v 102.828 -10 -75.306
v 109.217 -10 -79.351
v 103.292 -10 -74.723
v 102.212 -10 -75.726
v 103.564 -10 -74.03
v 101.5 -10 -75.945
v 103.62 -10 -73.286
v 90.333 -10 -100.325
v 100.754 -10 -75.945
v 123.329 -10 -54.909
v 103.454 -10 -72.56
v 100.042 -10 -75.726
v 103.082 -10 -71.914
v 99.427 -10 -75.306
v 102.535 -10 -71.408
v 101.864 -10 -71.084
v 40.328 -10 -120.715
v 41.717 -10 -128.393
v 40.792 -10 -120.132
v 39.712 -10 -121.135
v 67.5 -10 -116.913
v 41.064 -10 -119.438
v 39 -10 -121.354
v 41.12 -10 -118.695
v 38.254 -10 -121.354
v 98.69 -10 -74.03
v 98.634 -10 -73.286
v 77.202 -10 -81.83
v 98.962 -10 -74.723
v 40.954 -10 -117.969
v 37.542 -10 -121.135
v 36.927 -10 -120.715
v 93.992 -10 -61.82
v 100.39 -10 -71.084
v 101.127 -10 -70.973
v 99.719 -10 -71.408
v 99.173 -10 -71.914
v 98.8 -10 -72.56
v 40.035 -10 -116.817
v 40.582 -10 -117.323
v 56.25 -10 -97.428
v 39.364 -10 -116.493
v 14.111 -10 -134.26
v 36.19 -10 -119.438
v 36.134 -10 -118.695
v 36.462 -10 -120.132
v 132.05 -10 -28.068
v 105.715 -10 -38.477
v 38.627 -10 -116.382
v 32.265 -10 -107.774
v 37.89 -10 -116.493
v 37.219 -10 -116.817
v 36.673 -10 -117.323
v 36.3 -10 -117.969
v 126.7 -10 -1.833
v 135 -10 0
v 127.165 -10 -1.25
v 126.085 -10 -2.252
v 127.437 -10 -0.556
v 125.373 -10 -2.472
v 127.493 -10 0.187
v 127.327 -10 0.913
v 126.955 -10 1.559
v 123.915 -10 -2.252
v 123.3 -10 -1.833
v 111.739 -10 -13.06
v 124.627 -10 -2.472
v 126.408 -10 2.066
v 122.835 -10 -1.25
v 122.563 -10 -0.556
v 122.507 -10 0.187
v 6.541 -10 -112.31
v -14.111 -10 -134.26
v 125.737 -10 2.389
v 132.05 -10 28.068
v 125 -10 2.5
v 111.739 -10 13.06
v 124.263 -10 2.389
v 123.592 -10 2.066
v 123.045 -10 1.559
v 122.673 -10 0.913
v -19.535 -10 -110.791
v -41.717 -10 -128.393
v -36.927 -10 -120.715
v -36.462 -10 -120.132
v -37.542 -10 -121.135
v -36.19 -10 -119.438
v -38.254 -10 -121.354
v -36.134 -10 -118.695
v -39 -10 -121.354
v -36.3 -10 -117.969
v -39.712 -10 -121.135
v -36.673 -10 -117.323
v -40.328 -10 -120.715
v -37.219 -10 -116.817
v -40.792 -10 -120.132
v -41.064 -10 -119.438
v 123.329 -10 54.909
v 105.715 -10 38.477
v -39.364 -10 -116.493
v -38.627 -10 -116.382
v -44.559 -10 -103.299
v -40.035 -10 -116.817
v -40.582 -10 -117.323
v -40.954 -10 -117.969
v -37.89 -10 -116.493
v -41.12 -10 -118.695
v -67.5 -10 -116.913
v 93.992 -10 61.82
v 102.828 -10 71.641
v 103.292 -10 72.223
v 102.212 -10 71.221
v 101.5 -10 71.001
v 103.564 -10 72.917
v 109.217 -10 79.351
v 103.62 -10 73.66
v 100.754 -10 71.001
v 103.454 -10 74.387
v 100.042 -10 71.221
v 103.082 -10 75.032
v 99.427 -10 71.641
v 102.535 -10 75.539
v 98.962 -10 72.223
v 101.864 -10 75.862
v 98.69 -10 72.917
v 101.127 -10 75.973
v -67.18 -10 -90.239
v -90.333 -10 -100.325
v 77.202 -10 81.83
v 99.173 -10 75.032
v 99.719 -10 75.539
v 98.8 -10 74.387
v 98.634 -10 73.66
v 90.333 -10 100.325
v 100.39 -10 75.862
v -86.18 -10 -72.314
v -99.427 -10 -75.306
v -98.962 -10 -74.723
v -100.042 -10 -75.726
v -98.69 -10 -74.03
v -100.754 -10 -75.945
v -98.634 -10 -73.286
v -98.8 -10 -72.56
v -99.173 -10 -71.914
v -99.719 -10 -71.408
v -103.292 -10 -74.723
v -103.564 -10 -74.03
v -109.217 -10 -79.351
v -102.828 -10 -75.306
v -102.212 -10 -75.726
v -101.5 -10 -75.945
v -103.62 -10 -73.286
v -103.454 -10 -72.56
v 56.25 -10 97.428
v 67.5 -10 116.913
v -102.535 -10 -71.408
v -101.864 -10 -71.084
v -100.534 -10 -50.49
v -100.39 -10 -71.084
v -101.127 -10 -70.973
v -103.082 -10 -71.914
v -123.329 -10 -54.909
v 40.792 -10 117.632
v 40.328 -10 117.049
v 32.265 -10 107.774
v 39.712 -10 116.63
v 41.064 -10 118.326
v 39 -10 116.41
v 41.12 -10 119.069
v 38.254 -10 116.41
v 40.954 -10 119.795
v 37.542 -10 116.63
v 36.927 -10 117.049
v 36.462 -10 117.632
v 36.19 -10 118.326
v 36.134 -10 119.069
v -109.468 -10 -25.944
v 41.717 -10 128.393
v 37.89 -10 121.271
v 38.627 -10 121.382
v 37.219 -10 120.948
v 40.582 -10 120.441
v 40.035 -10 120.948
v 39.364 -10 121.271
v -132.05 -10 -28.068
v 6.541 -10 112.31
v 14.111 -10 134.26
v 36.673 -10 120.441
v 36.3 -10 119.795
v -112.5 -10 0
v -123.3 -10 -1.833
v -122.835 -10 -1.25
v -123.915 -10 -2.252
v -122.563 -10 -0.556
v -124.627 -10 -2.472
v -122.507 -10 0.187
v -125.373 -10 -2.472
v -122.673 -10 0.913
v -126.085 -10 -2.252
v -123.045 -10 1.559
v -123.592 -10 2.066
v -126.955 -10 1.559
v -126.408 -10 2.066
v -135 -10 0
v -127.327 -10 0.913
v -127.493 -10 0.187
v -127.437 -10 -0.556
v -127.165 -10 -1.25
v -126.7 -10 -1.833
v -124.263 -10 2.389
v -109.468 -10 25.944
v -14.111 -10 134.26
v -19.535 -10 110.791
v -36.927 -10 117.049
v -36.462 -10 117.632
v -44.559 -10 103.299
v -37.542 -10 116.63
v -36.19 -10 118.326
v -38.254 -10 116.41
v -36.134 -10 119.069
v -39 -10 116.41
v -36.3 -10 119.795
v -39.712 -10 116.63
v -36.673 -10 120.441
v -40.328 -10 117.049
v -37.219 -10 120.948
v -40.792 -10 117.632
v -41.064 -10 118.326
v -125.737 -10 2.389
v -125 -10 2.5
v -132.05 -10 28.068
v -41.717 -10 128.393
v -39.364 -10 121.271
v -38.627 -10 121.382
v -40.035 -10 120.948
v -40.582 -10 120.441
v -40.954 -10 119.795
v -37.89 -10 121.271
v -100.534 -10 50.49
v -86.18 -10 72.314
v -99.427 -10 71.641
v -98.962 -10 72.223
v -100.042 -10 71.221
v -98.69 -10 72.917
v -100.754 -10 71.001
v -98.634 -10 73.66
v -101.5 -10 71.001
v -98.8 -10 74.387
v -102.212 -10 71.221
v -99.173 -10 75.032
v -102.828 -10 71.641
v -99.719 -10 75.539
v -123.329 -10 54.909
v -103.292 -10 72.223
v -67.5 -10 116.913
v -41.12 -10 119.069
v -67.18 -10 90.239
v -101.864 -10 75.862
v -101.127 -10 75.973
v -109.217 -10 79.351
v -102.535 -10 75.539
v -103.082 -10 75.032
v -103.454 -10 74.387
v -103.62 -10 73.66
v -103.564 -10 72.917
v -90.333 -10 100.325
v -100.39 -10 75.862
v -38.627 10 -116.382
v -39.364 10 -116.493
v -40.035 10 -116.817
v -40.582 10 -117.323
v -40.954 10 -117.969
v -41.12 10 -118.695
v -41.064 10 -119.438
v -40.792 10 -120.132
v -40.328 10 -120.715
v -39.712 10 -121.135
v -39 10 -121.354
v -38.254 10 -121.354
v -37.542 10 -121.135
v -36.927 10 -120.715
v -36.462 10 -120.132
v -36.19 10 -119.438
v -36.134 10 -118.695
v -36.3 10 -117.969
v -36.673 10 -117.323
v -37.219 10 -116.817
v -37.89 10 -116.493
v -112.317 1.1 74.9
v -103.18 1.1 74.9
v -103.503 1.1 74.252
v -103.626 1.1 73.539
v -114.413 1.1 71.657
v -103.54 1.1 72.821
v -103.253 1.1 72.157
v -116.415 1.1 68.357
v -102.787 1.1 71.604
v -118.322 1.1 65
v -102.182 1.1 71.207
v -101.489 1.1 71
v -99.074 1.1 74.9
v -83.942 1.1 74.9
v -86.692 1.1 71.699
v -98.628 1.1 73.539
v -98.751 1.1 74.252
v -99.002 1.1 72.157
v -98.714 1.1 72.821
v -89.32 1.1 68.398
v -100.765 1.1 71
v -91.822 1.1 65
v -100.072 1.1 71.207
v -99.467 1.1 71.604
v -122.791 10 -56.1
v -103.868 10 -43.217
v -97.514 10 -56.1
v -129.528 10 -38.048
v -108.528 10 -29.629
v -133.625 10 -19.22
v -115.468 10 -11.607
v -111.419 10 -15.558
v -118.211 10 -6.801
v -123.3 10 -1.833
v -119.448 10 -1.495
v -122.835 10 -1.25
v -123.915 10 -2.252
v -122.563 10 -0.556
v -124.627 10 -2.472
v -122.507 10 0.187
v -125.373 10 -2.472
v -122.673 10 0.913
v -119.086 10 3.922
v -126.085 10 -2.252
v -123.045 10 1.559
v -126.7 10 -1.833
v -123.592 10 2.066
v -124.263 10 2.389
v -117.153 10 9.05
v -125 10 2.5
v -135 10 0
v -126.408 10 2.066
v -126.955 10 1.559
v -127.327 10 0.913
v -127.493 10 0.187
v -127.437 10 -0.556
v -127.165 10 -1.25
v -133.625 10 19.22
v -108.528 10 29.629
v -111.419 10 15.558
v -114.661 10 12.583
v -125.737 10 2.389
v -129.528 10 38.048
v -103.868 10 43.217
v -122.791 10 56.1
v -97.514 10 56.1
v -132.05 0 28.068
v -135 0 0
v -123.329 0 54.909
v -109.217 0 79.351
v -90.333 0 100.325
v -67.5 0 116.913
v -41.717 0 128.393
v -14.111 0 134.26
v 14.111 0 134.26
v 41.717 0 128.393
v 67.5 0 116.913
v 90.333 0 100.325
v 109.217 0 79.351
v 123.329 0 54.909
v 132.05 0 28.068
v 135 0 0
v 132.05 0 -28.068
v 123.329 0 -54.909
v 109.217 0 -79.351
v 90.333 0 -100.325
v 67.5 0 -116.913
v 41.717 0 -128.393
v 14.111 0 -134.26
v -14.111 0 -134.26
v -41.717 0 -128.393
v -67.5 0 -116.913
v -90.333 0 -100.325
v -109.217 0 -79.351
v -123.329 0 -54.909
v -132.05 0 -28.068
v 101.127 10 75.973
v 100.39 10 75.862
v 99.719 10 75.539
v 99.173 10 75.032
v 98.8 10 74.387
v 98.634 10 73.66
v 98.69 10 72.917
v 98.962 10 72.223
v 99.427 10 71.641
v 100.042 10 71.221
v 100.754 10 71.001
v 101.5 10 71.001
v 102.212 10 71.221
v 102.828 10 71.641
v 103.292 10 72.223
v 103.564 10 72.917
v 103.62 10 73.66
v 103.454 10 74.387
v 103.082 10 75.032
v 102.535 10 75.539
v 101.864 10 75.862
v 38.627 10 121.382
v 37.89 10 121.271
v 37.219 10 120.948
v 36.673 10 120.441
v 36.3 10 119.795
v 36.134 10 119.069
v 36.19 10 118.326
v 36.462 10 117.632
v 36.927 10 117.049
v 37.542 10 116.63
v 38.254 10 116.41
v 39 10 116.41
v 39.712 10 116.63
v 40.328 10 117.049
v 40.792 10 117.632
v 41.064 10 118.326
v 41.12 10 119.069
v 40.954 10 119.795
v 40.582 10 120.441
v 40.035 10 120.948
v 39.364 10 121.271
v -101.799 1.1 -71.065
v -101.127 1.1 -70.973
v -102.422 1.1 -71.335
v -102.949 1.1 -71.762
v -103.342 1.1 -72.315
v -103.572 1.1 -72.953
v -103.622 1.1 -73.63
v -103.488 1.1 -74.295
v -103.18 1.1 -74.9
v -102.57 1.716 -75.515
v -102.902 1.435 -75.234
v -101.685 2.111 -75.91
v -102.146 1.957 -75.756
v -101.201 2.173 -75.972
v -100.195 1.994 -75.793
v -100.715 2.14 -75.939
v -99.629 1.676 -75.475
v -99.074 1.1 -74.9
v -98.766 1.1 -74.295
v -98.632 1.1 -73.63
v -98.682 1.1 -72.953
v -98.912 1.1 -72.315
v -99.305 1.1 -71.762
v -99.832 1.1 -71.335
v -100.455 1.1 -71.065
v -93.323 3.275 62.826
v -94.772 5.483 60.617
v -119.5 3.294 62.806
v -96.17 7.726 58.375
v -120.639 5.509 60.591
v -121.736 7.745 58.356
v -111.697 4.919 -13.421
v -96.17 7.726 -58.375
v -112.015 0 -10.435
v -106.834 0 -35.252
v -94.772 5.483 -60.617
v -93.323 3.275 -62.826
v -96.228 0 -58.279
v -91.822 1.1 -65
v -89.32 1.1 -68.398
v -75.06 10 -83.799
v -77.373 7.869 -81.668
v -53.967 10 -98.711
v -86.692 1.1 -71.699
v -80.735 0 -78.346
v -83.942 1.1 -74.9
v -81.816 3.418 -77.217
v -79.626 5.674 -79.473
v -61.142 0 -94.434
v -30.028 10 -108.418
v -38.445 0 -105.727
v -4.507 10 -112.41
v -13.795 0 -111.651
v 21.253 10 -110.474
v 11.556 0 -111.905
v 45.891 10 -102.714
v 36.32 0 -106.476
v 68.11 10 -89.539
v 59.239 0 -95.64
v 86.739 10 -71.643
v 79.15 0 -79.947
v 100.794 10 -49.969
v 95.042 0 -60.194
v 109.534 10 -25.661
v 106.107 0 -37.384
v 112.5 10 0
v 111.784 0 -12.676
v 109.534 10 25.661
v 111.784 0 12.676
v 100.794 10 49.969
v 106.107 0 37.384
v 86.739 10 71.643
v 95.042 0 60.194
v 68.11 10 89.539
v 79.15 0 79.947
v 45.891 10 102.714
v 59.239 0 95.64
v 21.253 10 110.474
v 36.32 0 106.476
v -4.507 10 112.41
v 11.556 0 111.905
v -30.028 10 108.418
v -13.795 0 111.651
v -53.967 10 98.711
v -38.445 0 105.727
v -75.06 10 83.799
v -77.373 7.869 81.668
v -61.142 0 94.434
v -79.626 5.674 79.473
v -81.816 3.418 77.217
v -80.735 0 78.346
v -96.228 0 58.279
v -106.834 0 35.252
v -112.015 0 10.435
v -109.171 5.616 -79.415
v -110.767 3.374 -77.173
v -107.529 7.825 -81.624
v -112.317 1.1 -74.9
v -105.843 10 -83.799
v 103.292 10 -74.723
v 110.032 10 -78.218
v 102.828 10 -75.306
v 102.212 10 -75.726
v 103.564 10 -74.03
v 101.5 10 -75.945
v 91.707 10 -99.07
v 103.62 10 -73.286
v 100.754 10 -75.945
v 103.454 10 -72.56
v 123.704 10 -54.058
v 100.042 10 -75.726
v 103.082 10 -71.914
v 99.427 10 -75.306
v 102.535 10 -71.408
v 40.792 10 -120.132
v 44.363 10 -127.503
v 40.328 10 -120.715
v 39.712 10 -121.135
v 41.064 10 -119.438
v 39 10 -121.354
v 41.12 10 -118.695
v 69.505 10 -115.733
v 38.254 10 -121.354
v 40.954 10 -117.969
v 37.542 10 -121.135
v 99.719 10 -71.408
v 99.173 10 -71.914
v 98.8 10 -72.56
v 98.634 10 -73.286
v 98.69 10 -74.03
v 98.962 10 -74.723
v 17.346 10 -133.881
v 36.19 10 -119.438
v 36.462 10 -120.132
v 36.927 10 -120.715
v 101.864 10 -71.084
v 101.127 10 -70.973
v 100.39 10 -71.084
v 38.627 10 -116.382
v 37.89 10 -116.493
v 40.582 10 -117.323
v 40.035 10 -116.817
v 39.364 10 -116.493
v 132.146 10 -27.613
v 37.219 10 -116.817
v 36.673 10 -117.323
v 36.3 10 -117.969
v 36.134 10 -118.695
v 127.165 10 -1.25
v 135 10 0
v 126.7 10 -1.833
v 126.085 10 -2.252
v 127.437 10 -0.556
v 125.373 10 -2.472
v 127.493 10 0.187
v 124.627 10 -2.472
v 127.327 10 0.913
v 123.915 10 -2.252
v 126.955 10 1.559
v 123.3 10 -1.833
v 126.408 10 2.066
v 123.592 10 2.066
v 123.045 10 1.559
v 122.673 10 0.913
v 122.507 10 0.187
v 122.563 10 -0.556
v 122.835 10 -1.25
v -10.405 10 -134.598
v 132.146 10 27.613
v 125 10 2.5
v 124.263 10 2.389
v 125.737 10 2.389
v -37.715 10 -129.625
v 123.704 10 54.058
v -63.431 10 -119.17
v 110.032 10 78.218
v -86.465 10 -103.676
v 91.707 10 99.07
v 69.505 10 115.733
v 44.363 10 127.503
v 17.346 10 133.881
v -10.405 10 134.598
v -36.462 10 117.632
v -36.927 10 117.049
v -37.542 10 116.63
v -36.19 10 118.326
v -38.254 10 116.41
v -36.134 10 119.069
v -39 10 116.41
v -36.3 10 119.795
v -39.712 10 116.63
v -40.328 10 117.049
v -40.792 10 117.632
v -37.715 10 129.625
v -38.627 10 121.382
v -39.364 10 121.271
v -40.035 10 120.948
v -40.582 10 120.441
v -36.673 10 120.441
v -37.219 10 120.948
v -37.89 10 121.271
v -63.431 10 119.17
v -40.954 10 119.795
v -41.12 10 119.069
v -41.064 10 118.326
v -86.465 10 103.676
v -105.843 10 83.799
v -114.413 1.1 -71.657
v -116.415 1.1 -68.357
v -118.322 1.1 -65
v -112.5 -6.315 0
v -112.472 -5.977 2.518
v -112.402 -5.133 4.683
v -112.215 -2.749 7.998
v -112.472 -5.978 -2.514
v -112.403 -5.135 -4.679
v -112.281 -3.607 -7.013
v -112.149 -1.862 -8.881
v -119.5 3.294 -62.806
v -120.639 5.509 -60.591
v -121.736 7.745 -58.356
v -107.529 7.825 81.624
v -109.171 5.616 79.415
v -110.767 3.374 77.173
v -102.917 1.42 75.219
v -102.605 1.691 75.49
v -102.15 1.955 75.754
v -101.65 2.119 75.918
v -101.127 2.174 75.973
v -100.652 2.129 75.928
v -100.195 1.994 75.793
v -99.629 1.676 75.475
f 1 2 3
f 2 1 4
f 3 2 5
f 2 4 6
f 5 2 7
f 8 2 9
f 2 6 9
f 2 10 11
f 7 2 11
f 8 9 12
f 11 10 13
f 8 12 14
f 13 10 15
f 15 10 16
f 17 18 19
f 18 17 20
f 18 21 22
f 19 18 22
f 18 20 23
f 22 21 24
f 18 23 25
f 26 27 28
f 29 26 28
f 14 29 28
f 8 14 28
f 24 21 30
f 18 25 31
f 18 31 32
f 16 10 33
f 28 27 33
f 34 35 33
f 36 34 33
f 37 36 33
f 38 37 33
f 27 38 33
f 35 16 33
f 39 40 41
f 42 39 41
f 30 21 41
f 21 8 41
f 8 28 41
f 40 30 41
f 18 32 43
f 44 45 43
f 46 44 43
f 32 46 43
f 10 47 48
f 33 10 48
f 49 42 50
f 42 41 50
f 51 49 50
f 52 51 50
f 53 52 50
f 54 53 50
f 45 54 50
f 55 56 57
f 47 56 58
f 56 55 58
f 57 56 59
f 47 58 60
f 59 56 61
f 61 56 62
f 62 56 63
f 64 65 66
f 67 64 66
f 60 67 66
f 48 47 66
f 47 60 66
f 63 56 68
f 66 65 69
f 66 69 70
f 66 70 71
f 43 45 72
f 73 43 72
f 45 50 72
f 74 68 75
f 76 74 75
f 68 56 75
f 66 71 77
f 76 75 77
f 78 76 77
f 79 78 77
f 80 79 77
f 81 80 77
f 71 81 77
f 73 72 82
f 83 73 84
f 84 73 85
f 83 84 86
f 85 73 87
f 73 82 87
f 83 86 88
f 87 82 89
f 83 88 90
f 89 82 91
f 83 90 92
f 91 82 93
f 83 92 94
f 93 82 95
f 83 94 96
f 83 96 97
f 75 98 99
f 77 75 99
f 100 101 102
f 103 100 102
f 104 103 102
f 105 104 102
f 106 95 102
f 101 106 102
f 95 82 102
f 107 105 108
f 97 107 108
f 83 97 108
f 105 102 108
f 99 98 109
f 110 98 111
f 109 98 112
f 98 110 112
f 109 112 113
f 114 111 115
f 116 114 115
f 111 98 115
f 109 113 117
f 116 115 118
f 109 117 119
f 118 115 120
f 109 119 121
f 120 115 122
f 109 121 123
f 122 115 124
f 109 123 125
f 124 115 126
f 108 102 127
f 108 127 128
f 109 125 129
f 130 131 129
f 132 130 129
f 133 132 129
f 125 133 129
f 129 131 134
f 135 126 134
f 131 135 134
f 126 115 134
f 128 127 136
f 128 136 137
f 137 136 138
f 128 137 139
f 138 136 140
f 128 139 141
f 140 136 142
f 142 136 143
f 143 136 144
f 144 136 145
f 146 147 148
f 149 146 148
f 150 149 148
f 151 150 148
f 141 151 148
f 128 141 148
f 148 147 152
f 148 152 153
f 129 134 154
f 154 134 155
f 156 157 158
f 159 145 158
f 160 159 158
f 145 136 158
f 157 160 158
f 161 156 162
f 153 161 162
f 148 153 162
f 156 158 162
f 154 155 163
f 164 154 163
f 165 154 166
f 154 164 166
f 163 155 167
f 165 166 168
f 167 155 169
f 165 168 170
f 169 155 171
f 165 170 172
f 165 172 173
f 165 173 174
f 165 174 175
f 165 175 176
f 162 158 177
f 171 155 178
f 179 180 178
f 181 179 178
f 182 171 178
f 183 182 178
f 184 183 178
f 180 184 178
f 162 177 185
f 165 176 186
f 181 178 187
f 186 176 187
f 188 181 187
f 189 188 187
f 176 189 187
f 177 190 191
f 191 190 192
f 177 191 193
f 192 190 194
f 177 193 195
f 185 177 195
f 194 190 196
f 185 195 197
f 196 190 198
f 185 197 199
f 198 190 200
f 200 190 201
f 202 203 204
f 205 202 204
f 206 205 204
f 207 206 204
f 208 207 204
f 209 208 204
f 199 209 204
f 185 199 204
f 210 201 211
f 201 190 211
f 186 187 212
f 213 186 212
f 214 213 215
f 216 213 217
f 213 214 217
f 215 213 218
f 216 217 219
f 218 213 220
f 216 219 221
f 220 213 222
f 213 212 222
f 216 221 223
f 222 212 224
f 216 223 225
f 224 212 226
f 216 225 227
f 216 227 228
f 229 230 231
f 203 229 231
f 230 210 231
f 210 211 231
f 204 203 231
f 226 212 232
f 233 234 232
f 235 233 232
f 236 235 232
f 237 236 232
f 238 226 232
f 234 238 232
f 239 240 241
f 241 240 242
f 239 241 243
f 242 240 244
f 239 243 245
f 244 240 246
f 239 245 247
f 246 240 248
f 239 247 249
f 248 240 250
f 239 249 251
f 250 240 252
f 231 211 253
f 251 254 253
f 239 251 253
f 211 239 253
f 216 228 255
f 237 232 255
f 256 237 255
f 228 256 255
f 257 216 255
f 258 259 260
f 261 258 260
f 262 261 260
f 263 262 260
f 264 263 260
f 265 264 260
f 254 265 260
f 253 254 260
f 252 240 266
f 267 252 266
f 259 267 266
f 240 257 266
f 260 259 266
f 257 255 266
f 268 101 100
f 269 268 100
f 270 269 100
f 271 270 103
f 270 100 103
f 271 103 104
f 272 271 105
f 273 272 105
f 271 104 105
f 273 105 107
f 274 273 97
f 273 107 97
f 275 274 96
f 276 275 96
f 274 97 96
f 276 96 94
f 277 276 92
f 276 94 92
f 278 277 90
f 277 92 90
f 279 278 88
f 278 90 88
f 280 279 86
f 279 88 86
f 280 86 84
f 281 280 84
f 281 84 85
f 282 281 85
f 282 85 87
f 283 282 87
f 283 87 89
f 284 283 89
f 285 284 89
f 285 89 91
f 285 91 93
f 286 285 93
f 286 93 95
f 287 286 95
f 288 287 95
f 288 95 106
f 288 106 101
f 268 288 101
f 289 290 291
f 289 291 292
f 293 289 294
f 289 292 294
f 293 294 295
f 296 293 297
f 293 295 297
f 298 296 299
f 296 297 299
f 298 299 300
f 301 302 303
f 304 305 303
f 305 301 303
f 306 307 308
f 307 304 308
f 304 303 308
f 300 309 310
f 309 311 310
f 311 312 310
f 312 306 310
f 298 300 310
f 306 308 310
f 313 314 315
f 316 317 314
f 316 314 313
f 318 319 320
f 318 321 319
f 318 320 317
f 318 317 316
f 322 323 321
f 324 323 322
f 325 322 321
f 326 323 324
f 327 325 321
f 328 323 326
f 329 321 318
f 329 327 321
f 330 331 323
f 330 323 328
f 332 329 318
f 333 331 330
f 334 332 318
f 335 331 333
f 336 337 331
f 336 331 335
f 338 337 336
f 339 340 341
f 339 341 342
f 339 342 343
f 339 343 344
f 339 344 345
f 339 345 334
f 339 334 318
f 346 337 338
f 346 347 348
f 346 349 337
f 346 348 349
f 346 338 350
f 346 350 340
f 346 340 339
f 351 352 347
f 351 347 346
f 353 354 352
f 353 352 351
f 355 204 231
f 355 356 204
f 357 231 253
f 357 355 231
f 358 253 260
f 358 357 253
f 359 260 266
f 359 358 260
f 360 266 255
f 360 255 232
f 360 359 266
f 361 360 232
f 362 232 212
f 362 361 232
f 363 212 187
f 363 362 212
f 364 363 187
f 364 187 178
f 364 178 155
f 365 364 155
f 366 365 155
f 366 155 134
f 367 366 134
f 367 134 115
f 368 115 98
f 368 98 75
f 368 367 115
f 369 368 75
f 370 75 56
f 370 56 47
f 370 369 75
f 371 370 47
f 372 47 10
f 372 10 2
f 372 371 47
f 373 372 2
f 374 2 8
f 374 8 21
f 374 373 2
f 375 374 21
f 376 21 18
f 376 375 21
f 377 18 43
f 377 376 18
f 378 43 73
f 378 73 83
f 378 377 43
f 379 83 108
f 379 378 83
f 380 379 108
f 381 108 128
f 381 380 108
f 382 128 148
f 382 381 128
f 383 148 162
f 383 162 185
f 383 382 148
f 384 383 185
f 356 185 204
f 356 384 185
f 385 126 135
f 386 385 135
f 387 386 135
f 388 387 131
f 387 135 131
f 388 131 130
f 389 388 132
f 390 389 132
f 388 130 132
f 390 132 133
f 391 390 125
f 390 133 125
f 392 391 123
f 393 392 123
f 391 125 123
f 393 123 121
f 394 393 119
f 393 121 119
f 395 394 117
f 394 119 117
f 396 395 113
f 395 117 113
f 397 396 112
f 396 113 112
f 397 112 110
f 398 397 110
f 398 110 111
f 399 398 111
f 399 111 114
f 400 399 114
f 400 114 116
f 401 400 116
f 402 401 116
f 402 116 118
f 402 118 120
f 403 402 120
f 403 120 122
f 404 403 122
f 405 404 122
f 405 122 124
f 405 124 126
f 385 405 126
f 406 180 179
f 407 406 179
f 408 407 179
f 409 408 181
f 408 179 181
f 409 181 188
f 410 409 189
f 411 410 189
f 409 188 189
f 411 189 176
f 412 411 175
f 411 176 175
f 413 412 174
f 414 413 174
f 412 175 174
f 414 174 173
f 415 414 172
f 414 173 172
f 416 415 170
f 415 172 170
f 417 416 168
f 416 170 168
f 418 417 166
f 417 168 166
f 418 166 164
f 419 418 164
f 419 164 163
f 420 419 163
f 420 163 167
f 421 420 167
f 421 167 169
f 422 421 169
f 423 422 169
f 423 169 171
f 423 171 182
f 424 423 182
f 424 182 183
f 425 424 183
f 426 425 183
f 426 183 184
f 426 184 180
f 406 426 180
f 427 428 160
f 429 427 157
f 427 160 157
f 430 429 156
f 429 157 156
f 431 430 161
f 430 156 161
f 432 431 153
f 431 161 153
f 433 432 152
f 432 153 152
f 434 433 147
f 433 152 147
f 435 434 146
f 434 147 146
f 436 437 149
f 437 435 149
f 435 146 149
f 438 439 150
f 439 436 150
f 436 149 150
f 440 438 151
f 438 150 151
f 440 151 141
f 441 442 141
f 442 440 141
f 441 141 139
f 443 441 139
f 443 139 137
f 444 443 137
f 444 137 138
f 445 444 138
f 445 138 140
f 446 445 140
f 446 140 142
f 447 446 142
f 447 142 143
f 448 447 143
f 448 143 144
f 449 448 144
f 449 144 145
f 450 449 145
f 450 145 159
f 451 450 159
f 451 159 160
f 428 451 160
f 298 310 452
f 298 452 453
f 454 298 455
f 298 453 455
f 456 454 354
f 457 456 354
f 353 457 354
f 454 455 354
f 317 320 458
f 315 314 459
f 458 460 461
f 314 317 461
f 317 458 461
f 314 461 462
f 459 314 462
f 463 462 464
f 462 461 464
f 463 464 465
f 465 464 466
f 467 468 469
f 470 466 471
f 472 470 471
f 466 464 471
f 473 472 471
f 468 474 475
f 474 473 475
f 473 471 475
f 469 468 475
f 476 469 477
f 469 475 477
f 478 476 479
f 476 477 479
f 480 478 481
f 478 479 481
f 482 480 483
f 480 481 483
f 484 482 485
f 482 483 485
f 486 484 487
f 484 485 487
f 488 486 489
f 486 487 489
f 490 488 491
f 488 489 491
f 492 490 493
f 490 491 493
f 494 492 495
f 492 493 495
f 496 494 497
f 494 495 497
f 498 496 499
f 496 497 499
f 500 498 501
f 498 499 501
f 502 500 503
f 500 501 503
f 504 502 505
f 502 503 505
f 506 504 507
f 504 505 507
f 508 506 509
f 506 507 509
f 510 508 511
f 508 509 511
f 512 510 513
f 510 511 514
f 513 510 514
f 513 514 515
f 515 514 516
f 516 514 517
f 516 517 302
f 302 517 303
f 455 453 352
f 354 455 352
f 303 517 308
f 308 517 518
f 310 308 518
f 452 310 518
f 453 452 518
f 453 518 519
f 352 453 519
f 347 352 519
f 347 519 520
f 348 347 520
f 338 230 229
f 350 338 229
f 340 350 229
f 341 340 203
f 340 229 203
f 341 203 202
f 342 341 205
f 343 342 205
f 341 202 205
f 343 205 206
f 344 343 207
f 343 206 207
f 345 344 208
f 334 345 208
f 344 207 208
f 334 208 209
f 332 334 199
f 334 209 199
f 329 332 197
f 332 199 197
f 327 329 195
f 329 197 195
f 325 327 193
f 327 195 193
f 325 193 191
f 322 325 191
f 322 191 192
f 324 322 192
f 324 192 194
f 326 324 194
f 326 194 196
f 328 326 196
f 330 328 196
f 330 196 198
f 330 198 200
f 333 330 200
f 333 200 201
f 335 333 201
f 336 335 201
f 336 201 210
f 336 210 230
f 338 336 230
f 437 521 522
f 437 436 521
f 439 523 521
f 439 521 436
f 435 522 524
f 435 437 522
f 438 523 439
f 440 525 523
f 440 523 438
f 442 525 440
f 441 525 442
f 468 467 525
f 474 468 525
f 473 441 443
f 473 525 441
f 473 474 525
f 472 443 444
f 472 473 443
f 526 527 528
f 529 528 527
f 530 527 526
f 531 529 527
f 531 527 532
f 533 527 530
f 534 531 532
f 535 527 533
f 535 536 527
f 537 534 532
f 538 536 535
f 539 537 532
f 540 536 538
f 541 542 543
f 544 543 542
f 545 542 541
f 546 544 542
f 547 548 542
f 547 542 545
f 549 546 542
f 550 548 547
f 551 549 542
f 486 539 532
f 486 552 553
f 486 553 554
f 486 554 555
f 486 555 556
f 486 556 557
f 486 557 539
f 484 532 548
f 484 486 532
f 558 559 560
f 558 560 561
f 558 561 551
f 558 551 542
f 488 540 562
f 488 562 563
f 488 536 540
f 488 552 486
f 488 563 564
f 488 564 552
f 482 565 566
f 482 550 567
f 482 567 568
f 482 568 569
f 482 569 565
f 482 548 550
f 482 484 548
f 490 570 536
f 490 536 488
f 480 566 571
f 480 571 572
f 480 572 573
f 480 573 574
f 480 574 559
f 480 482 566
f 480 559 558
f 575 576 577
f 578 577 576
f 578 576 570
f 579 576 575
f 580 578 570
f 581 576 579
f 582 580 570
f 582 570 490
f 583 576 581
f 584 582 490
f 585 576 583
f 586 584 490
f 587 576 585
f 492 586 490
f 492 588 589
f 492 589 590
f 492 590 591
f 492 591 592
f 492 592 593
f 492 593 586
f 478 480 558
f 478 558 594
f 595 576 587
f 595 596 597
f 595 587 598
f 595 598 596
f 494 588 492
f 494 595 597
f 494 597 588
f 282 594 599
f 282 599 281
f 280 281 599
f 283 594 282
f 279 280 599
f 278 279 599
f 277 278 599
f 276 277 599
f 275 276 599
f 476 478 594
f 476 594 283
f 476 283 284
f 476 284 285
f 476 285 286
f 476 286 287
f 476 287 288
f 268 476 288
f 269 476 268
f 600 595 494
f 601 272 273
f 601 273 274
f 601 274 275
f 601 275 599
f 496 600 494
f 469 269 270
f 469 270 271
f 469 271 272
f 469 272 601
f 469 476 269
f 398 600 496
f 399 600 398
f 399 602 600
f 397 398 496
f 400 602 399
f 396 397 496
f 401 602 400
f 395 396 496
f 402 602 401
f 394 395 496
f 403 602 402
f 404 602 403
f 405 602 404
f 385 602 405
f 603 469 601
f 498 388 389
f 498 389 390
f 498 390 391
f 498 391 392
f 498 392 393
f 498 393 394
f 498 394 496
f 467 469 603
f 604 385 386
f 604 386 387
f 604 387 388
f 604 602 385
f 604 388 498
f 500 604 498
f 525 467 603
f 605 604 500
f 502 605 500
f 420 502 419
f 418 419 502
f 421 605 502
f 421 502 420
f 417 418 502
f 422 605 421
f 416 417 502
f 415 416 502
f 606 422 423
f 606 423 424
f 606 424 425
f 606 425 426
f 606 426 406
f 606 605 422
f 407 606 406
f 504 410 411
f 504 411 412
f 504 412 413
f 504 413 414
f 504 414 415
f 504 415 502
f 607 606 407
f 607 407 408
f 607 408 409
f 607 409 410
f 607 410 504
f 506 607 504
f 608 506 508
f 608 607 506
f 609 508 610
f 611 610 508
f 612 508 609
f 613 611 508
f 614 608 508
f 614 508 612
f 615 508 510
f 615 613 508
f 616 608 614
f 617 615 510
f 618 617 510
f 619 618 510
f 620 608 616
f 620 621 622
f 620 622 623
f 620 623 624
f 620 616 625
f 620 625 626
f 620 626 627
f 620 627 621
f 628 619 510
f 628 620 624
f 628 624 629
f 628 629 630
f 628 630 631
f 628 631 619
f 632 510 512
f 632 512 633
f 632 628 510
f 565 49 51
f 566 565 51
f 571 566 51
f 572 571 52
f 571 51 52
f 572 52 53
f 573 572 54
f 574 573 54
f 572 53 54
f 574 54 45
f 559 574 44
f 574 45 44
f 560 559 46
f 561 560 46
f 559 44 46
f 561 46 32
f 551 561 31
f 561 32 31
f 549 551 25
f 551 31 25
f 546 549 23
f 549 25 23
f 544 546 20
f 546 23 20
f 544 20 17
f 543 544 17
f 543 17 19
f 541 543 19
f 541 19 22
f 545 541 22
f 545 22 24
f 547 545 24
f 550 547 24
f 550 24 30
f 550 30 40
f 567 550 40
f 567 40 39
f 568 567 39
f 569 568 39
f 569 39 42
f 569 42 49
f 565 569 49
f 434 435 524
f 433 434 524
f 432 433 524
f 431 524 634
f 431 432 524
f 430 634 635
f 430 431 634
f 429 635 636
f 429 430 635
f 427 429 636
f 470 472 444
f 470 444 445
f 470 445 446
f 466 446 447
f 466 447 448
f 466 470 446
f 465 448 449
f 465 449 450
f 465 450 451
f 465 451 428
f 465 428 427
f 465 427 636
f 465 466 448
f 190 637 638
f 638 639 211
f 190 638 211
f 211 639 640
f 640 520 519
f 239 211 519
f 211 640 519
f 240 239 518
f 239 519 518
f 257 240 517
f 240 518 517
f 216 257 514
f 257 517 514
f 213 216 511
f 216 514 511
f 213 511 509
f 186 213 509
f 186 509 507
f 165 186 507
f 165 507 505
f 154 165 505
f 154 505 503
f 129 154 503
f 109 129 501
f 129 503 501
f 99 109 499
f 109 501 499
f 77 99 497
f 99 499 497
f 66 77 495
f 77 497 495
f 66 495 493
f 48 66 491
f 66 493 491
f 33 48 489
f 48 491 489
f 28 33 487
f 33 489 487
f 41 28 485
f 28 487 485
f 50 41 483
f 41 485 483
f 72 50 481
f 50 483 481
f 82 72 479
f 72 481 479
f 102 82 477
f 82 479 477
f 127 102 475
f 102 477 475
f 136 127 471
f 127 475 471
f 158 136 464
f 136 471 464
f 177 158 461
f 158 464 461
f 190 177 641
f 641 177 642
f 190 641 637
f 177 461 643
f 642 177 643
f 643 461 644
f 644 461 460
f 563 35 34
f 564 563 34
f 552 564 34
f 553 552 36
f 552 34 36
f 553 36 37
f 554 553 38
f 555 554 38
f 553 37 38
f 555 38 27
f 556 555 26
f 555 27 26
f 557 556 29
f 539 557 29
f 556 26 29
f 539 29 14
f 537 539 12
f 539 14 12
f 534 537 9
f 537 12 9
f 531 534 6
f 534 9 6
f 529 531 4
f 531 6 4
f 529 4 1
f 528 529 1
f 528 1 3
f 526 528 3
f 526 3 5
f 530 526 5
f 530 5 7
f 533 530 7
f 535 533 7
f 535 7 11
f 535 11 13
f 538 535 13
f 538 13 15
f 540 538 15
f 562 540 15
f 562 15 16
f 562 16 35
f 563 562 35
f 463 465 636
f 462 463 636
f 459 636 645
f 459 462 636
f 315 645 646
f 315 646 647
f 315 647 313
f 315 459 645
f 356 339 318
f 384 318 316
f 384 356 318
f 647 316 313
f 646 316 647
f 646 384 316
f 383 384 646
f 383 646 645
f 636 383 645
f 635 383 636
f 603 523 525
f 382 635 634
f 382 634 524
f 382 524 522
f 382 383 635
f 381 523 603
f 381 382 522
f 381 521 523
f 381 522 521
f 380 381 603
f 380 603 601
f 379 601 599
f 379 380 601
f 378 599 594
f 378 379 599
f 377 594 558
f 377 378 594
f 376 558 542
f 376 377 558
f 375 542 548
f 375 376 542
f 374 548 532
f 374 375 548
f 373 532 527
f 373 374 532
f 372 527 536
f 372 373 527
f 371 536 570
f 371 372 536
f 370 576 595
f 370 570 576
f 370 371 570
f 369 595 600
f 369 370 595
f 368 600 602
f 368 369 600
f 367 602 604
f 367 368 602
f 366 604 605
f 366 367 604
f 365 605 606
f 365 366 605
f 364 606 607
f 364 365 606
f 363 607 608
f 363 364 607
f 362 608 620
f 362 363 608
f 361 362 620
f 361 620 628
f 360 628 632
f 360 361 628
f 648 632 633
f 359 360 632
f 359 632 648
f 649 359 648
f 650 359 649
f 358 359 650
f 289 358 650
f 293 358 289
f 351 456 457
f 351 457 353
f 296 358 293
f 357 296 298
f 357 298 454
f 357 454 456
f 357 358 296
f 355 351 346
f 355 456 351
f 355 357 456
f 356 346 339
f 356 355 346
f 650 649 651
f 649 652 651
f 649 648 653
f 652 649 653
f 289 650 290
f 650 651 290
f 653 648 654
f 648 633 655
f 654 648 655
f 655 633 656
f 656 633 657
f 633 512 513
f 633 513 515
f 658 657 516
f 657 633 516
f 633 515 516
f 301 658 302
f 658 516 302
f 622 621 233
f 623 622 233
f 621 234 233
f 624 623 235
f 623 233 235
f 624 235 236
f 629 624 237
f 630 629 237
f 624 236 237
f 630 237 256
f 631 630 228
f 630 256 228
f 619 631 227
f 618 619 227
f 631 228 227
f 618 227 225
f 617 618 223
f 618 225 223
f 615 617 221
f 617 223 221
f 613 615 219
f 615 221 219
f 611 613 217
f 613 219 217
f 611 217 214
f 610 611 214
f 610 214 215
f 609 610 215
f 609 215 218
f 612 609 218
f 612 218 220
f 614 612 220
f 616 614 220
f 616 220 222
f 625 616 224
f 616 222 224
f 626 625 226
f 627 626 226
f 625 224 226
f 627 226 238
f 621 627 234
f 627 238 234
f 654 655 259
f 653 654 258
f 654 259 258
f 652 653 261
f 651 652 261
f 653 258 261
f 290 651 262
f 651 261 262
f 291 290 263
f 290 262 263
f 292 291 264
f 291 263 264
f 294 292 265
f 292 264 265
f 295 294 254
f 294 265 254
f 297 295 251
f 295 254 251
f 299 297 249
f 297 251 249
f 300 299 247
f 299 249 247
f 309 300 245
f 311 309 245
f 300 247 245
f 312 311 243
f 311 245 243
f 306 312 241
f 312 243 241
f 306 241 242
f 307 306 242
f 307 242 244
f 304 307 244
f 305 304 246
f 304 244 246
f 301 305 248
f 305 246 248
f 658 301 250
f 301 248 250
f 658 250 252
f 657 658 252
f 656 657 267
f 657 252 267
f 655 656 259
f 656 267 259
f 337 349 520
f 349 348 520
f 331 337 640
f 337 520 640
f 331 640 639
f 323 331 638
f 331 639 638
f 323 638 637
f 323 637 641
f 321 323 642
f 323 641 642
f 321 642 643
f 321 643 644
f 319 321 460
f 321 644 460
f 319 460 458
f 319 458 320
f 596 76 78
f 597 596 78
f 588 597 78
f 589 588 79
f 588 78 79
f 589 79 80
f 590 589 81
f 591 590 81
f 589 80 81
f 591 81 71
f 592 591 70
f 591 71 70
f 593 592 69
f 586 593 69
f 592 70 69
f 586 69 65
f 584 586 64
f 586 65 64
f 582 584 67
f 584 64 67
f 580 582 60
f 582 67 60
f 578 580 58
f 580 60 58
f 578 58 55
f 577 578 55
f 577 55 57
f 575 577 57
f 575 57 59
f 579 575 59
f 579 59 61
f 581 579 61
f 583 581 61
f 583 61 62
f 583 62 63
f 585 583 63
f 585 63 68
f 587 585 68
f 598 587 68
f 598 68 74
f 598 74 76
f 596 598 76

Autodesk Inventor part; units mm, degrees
ref_plane "YZ Plane" through (0, 0, 0) normal (1, 0, 0) x (0, 1, 0)
sketch "Sketch1" plane through (0, 0, 0) normal (0, 1, 0) x (-1, 0, 0)
  circle A0 centre (0, 0) radius 135
  circle A1 centre (0, 0) radius 112.5
  dimension "d0" = 270
  dimension "d1" = 225
extrude "Extrusion1" add sketch "Sketch1" along normal mid plane 20
sketch "Sketch3" plane through (0, 10, 0) normal (0, 1, 0) x (1, 0, 0)
  circle A0 centre (0, 0) radius 125
  circle A1 centre (125, 0) radius 2.5
  circle A2 centre (101.1271, 73.4732) radius 2.5
  circle A3 centre (38.6271, 118.8821) radius 2.5
  circle A4 centre (-38.6271, 118.8821) radius 2.5
  circle A5 centre (-101.1271, 73.4732) radius 2.5
  circle A6 centre (-125, 0) radius 2.5
  circle A7 centre (-101.1271, -73.4732) radius 2.5
  circle A8 centre (-38.6271, -118.8821) radius 2.5
  circle A9 centre (38.6271, -118.8821) radius 2.5
  circle A10 centre (101.1271, -73.4732) radius 2.5
  dimension "d7" = 250
  dimension "d8" = 5
  dimension "d11" = 360
hole "Hole1" at (125, 10, 0) at (101.1271, 10, 73.4732) at (38.6271, 10, 118.8821) at (-38.6271, 10, 118.8821) at (-101.1271, 10, 73.4732) at (-125, 10, 0) at (-101.1271, 10, -73.4732) at (-38.6271, 10, -118.8821) at (38.6271, 10, -118.8821) at (101.1271, 10, -73.4732) direction (0, -1, 0) diameter 5 end through all
ref_plane "Work Plane6" through (-134.9375, 20, -12.7) normal (0.3947, -0.9188, 0) x (0, 0, 1)
ref_plane "Work Plane7" through (-109.8713, -38.3432, -12.7) normal (0.3947, -0.9188, 0) x (0, 0, 1)
sketch "Sketch5" plane through (-109.8713, -38.3432, -12.7) normal (0.3947, -0.9188, 0) x (0, 0, 1)
  circle A0 centre (12.7, -30.2265) radius 20
  point P0 (12.7, -116.0845)
  dimension "d26" = 40
  dimension "d27" = 85.858
extrude "Extrusion4" cut sketch "Sketch5" against normal blind 251.3
sketch "Sketch6" plane through (0, 0, 0) normal (1, 0, 0) x (0, 1, 0)
  line L0 (10, 15.5601) -> (10, -15.5601) projected
  line L1 (10, 0) -> (-10, 0)
  line L2 (-10, -2.5) -> (-10, 2.5) projected
  line L3 (11, -84.799) -> (1.1005, -74.8995)
  line L4 (11, -84.799) -> (25, -84.799) construction
  line L5 (11, -84.799) -> (11, -65)
  line L6 (1.1005, -74.8995) -> (1.1005, -65)
  line L7 (1.1005, -65) -> (11, -55.1005)
  line L8 (1.1005, -65) -> (15.1005, -65) construction
  line L9 (11, -55.1005) -> (11, -65)
  line L10 (11, 84.799) -> (1.1005, 74.8995)
  line L11 (11, 84.799) -> (25, 84.799) construction
  line L12 (11, 84.799) -> (11, 65)
  line L13 (1.1005, 74.8995) -> (1.1005, 65)
  line L14 (1.1005, 65) -> (11, 55.1005)
  line L15 (1.1005, 65) -> (15.1005, 65) construction
  line L16 (11, 55.1005) -> (11, 65)
  point P0 (0, 0)
  dimension "d30" = 14
  dimension "d31" = 135
  dimension "d34" = 65
  dimension "d35" = 14
  dimension "d36" = 45
extrude "Extrusion5" cut sketch "Sketch6" against normal through all
properties part number "Cylinder Spacer (x3)"
